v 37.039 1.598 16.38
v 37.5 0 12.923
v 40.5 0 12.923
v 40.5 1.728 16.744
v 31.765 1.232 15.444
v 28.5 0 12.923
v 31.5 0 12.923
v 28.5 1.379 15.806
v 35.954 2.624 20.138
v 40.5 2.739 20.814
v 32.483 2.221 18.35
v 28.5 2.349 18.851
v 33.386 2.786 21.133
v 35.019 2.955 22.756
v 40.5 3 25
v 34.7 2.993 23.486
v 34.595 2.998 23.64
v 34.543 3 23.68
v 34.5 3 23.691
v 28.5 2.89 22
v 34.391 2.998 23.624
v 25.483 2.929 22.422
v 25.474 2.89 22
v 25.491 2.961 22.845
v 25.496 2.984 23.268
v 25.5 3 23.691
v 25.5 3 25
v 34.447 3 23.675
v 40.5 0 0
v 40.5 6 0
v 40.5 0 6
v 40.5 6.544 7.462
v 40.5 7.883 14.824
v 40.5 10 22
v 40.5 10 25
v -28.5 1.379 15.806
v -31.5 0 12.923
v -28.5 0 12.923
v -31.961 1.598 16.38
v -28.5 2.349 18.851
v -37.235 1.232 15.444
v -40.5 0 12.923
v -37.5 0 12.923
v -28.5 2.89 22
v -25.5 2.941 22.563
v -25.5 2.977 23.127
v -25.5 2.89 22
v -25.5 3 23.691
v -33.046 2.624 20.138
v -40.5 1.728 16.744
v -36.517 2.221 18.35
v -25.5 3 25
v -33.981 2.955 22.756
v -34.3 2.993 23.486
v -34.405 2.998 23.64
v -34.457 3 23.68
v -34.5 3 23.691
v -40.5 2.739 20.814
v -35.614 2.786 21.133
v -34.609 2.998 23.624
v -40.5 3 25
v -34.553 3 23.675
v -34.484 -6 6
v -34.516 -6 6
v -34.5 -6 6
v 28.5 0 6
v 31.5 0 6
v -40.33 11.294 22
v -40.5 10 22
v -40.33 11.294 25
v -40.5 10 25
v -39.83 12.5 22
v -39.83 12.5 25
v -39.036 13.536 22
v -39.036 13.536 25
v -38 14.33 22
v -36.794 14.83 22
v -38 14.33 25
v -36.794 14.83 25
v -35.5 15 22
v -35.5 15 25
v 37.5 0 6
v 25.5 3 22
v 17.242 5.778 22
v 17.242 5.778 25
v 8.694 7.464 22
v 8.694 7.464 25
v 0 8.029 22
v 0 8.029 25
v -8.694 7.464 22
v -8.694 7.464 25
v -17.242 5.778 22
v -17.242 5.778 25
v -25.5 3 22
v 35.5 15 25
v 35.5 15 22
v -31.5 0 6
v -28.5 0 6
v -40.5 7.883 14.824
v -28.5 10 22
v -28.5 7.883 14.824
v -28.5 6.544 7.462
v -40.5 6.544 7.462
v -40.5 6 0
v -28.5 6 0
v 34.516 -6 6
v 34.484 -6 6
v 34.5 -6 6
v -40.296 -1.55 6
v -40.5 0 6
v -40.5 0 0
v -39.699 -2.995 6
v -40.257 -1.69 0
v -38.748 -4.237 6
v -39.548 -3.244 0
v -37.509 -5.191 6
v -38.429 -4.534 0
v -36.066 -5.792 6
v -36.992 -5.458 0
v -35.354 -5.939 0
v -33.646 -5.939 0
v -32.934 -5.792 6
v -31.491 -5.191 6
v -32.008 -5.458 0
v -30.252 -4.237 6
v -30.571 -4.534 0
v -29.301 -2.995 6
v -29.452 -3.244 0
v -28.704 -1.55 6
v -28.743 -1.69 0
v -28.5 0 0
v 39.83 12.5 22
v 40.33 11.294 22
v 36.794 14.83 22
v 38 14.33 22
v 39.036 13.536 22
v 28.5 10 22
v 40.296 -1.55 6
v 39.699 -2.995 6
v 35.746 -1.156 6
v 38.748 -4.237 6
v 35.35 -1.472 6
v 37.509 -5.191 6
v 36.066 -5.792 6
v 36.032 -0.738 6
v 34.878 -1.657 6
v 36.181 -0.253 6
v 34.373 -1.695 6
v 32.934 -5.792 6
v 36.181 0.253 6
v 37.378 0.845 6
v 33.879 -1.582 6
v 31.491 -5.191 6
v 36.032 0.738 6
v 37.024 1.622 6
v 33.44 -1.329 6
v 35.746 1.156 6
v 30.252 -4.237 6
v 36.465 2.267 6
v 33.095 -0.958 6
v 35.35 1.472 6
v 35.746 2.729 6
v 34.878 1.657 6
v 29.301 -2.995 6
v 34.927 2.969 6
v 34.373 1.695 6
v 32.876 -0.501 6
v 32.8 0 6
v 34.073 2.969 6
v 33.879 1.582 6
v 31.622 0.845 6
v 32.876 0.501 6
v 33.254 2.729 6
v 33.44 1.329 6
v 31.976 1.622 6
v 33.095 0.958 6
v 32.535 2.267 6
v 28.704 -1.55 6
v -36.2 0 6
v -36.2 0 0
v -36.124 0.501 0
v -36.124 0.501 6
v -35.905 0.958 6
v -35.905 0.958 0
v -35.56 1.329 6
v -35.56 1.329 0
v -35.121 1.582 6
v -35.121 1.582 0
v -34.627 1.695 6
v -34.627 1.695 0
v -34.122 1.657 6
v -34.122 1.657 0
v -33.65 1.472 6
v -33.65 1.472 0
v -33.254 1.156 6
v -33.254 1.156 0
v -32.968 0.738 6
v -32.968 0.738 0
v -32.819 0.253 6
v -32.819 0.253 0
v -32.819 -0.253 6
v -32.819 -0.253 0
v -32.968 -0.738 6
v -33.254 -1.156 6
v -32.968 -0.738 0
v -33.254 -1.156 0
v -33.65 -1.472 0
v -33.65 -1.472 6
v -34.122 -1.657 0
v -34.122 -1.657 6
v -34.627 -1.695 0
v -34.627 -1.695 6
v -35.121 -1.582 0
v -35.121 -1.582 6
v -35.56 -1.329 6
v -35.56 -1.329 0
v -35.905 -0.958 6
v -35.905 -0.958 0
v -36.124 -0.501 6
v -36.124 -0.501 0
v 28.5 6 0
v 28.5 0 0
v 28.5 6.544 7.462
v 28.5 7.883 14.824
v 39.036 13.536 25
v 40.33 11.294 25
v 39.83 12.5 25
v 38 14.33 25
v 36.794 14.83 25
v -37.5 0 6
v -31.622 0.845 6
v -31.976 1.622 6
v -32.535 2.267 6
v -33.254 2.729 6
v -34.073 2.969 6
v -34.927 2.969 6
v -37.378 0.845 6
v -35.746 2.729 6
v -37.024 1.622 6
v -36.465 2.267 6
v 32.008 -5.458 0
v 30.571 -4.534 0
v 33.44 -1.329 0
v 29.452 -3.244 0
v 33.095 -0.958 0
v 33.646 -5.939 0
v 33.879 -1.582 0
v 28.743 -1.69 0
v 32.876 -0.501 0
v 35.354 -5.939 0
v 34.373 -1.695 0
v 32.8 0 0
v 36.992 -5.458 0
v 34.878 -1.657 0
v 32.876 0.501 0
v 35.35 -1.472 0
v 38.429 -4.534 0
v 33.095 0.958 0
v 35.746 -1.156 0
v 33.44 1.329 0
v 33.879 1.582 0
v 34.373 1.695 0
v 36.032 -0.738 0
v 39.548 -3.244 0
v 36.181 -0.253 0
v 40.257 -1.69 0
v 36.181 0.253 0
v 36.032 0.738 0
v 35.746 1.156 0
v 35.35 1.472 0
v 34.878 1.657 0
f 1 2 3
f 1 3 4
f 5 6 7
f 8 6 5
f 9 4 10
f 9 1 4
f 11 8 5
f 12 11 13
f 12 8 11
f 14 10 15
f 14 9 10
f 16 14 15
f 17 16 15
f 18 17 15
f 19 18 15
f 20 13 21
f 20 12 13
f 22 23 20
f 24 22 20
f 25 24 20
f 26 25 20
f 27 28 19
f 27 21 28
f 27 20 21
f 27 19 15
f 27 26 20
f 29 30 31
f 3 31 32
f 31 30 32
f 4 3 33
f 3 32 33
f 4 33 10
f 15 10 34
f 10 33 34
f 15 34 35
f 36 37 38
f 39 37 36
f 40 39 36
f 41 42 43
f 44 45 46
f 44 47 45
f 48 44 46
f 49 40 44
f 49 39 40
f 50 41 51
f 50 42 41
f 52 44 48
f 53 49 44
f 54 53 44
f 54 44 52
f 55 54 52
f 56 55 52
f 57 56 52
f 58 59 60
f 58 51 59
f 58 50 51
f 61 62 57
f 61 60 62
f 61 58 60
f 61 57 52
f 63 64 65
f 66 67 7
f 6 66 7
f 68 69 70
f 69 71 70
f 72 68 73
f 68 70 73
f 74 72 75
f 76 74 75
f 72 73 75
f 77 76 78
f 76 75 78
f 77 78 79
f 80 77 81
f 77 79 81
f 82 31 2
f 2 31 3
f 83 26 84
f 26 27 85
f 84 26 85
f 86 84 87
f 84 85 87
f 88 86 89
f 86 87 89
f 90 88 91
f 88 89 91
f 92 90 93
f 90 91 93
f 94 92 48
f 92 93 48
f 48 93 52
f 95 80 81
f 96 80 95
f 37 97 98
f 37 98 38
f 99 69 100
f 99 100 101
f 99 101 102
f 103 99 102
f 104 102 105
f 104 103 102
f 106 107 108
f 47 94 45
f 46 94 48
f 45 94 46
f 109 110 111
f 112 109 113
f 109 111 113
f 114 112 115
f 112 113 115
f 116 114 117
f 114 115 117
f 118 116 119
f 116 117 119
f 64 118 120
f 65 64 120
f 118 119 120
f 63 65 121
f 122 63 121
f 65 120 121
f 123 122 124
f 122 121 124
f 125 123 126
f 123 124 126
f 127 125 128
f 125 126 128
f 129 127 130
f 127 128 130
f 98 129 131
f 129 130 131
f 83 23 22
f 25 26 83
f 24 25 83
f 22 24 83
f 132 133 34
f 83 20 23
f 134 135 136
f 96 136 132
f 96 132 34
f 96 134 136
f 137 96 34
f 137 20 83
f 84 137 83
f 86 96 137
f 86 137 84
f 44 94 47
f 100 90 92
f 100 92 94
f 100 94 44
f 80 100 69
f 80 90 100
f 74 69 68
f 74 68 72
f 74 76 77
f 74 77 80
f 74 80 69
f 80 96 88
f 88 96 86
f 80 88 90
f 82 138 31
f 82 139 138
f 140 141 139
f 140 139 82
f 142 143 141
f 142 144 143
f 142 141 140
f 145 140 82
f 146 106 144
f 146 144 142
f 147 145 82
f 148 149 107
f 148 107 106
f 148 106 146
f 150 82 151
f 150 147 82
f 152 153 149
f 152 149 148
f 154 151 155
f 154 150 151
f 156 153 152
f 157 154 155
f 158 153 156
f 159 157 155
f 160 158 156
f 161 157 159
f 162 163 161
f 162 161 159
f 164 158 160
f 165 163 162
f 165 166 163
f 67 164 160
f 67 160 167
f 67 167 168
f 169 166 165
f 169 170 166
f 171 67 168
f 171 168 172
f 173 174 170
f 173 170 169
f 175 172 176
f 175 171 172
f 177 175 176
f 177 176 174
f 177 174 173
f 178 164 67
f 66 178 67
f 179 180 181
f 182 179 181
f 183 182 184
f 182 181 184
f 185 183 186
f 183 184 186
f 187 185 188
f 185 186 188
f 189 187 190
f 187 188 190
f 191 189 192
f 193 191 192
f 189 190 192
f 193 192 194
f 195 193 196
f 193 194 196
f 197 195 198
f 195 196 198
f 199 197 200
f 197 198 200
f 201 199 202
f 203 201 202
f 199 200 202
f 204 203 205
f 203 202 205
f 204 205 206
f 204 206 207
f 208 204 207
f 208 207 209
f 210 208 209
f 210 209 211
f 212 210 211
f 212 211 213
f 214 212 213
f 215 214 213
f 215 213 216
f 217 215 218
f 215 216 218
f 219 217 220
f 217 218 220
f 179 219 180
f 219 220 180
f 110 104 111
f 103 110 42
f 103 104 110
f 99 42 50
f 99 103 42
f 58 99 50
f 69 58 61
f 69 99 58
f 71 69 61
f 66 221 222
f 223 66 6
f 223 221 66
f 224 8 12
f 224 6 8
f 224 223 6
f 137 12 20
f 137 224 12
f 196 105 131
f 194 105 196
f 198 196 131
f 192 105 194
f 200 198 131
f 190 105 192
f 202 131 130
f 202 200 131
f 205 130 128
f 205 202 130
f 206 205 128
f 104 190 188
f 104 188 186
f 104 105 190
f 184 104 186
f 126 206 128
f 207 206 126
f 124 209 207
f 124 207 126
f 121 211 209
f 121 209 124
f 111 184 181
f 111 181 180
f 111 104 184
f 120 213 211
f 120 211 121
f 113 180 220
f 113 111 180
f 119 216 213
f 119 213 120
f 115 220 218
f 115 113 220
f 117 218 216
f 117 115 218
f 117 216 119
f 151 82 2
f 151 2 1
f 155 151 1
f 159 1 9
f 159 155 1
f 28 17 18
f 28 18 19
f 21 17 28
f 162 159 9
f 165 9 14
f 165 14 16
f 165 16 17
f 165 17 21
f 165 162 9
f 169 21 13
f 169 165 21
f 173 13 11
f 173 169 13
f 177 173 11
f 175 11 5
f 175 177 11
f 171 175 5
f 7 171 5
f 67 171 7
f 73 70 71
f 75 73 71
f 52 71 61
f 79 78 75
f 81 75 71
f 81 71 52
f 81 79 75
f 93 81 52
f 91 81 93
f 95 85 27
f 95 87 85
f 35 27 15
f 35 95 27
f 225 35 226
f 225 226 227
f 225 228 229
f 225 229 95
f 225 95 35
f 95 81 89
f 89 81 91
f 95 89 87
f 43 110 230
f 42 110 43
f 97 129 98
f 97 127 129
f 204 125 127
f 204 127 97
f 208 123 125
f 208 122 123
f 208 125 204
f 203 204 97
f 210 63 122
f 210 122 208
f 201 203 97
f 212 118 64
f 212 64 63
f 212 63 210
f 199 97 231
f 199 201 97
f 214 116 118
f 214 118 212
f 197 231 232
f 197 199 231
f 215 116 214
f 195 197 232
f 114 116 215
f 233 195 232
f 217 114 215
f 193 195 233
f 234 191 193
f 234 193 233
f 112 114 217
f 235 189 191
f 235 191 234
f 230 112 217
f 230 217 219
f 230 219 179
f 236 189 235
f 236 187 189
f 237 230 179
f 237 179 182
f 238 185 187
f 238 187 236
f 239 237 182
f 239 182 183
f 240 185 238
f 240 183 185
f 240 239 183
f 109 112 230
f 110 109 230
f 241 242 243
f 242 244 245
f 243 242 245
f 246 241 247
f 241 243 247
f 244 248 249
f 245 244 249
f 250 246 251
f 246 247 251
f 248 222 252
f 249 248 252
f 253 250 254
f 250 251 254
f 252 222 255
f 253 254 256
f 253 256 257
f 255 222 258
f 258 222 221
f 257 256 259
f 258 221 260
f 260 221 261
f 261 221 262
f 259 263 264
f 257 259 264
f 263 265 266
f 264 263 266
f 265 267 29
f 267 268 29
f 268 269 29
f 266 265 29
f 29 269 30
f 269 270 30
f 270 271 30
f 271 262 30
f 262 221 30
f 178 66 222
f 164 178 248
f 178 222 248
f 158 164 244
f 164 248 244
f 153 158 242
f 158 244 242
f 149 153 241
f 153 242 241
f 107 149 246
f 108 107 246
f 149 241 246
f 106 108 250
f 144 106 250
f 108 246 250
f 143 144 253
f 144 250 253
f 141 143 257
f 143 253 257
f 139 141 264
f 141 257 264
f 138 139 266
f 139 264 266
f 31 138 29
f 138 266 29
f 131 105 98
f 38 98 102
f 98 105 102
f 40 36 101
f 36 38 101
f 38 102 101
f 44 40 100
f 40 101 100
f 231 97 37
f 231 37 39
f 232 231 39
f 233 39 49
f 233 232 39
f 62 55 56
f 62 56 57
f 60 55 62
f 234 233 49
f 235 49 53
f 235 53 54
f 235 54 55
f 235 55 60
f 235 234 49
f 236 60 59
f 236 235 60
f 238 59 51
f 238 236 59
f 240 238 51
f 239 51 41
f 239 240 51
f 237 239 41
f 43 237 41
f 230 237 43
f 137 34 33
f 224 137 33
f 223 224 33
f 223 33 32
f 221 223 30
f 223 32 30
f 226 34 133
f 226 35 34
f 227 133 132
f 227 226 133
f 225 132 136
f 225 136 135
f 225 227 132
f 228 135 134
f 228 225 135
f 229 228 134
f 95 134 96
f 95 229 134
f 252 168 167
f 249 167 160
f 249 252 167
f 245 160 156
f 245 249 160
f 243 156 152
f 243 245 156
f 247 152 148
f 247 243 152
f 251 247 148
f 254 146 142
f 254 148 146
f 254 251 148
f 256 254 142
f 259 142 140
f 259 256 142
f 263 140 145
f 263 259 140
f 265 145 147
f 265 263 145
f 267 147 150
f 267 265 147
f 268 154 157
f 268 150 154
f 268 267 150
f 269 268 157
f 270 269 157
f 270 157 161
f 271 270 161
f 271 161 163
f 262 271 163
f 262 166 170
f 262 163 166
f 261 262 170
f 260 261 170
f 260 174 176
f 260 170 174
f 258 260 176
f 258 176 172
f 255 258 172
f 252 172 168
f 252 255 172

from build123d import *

# Parameters (mm, degrees)
IZIM1_R                       = 6
IZIM1_R_2                     = 1.7
Y_KSEKLIK_EKSTR_ZYON1_DEPTH   = 22
Y_KSEKLIK_EKSTR_ZYON1_2_DEPTH = 22
IZIM2_R                       = 1.7
Y_KSEKLIK_EKSTR_ZYON2_DEPTH   = 3
RADYUS2_R                     = 5
IZIM4_R                       = 1.6
KES_EKSTR_ZYON1_DEPTH         = 10
Y_KSEKLIK_EKSTR_ZYON5_DEPTH   = 12
Y_KSEKLIK_EKSTR_ZYON6_DEPTH   = 12
KES_EKSTR_ZYON2_DEPTH         = 97
IZIM10_W                      = 6.92309327
IZIM10_H                      = 6.61748972
KES_EKSTR_ZYON3_DEPTH         = 97
IZIM11_R                      = 3
KES_EKSTR_ZYON4_DEPTH         = 97
IZIM12_R                      = 1.6
Y_KSEKLIK_EKSTR_ZYON8_DEPTH   = 10
IZIM13_R                      = 1.7
KES_EKSTR_ZYON5_DEPTH         = 10
KES_EKSTR_ZYON6_DEPTH         = 10


with BuildPart() as part:
    # Çizim1 → Yükseklik-Ekstrüzyon1 (new body)
    with BuildSketch(Plane.XY):
        with Locations((34.5, 0)):
            Circle(IZIM1_R)
        with Locations((34.5, 0)):
            Circle(IZIM1_R_2, mode=Mode.SUBTRACT)
    extrude(amount=Y_KSEKLIK_EKSTR_ZYON1_DEPTH)



with BuildPart() as body_2:
    # Çizim1 → Y_kseklik-Ekstr_zyon1 2 (new body)
    with BuildSketch(Plane.XY):
        with Locations((-34.5, 0)):
            Circle(IZIM1_R)
        with Locations((-34.5, 0)):
            Circle(IZIM1_R_2, mode=Mode.SUBTRACT)
    extrude(amount=Y_KSEKLIK_EKSTR_ZYON1_2_DEPTH)


with BuildPart() as part_1:
    add(part.part)

    add(body_2.part)  # Yükseklik-Ekstrüzyon2 merges body 2
    # Çizim2 → Yükseklik-Ekstrüzyon2 (add)
    with BuildSketch(Plane.XY.offset(22)):
        with BuildLine():
            Line((-40.5, 0), (-40.5, 10))
            Line((-40.5, 10), (-40.5, 15))
            Line((-40.5, 15), (40.5, 15))
            Line((40.5, 15), (40.5, 10))
            Line((40.5, 10), (40.5, 0))
            ThreePointArc((40.5, 0), (37.400947284, -5.252095282), (31.305165048, -5.078683848))
            ThreePointArc((31.305165048, -5.078683848), (23.833029749, -2.135860906), (16.017952, -0.287193122))
            ThreePointArc((16.017952, -0.287193122), (8.530102356, 4.184082865), (0, 6))
            ThreePointArc((0, 6), (-8.530102356, 4.184082865), (-16.017952, -0.287193122))
            ThreePointArc((-16.017952, -0.287193122), (-23.833029749, -2.135860906), (-31.305165048, -5.078683848))
            ThreePointArc((-31.305165048, -5.078683848), (-37.400947284, -5.252095282), (-40.5, 0))
        make_face()
        with Locations((-34.5, 0)):
            Circle(IZIM2_R, mode=Mode.SUBTRACT)
        with Locations((34.5, 0)):
            Circle(IZIM2_R, mode=Mode.SUBTRACT)
    extrude(amount=Y_KSEKLIK_EKSTR_ZYON2_DEPTH)

    # Radyus2
    radyus2_edges = [part_1.edges().sort_by_distance(p)[0] for p in [
        (40.5, 15, 23.5),
        (-40.5, 15, 23.5),
    ]]
    fillet(radyus2_edges, radius=RADYUS2_R)

    # Çizim4 → Kes-Ekstrüzyon1 (cut)
    with BuildSketch(Plane.XY.offset(25)):
        with Locations((-35, 5)):
            Circle(IZIM4_R)
        with Locations((35, 5)):
            Circle(IZIM4_R)
    extrude(amount=-KES_EKSTR_ZYON1_DEPTH, mode=Mode.SUBTRACT)

    # Çizim5 → Yükseklik-Ekstrüzyon5 (add)
    with BuildSketch(Plane.ZY.offset(40.5)):
        with BuildLine():
            Line((0, 6), (0, 0))
            Line((0, 0), (22, 0))
            Line((22, 0), (22, 10))
            ThreePointArc((22, 10), (11.160931836, 7.114874904), (0, 6))
        make_face()
    extrude(amount=-Y_KSEKLIK_EKSTR_ZYON5_DEPTH)

    # Çizim6 → Yükseklik-Ekstrüzyon6 (add)
    with BuildSketch(Plane(origin=(40.5, 0, 0), x_dir=(0, 0, -1), z_dir=(1, 0, 0))):
        with BuildLine():
            Line((-22, 0), (-22, 10))
            ThreePointArc((-22, 10), (-11.160931836, 7.114874904), (0, 6))
            Line((0, 6), (0, 0))
            Line((0, 0), (-22, 0))
        make_face()
    extrude(amount=-Y_KSEKLIK_EKSTR_ZYON6_DEPTH)

    # Çizim9 → Kes-Ekstrüzyon2 (cut)
    with BuildSketch(Plane.ZY.offset(40.5)):
        with BuildLine():
            Line((25, 3), (25, -6.889643691))
            Line((25, -6.889643691), (6, -6))
            ThreePointArc((6, -6), (14.421146183, 0.77758028), (25, 3))
        make_face()
    extrude(amount=-KES_EKSTR_ZYON2_DEPTH, mode=Mode.SUBTRACT)

    # Çizim10 → Kes-Ekstrüzyon3 (cut)
    with BuildSketch(Plane.ZY.offset(40.5)):
        with Locations((9.461563543, -3.30874486)):
            Rectangle(IZIM10_W, IZIM10_H)
    extrude(amount=-KES_EKSTR_ZYON3_DEPTH, mode=Mode.SUBTRACT)

    # Çizim11 → Kes-Ekstrüzyon4 (cut)
    with BuildSketch(Plane.XY.offset(6.000016908)):
        with Locations((-34.5, 0)):
            Circle(IZIM11_R)
        with Locations((34.5, 0)):
            Circle(IZIM11_R)
    extrude(amount=KES_EKSTR_ZYON4_DEPTH, mode=Mode.SUBTRACT)

    # Çizim12 → Yükseklik-Ekstrüzyon8 (add)
    with BuildSketch(Plane.XY.offset(25)):
        with Locations((-35, 5)):
            Circle(IZIM12_R)
        with Locations((35, 5)):
            Circle(IZIM12_R)
    extrude(amount=-Y_KSEKLIK_EKSTR_ZYON8_DEPTH)

    # Çizim13 → Kes-Ekstrüzyon5 (cut)
    with BuildSketch(Plane(origin=(0, 0, 0), x_dir=(-1, 0, 0), z_dir=(0, 0, -1))):
        with Locations((34.5, 0)):
            Circle(IZIM13_R)
        with Locations((-34.5, 0)):
            Circle(IZIM13_R)
    extrude(amount=-KES_EKSTR_ZYON5_DEPTH, mode=Mode.SUBTRACT)

    # Çizim15 → Kes-Ekstrüzyon6 (cut)
    with BuildSketch(Plane.XY.offset(25)):
        with BuildLine():
            Line((-25.5, 3), (-25.5, -6.328988838))
            Line((-25.5, -6.328988838), (21.982441761, -11.682646241))
            Line((21.982441761, -11.682646241), (25.5, 3))
            ThreePointArc((25.5, 3), (0, 8.028595904), (-25.5, 3))
        make_face()
    extrude(amount=-KES_EKSTR_ZYON6_DEPTH, mode=Mode.SUBTRACT)


solid = part_1.part
